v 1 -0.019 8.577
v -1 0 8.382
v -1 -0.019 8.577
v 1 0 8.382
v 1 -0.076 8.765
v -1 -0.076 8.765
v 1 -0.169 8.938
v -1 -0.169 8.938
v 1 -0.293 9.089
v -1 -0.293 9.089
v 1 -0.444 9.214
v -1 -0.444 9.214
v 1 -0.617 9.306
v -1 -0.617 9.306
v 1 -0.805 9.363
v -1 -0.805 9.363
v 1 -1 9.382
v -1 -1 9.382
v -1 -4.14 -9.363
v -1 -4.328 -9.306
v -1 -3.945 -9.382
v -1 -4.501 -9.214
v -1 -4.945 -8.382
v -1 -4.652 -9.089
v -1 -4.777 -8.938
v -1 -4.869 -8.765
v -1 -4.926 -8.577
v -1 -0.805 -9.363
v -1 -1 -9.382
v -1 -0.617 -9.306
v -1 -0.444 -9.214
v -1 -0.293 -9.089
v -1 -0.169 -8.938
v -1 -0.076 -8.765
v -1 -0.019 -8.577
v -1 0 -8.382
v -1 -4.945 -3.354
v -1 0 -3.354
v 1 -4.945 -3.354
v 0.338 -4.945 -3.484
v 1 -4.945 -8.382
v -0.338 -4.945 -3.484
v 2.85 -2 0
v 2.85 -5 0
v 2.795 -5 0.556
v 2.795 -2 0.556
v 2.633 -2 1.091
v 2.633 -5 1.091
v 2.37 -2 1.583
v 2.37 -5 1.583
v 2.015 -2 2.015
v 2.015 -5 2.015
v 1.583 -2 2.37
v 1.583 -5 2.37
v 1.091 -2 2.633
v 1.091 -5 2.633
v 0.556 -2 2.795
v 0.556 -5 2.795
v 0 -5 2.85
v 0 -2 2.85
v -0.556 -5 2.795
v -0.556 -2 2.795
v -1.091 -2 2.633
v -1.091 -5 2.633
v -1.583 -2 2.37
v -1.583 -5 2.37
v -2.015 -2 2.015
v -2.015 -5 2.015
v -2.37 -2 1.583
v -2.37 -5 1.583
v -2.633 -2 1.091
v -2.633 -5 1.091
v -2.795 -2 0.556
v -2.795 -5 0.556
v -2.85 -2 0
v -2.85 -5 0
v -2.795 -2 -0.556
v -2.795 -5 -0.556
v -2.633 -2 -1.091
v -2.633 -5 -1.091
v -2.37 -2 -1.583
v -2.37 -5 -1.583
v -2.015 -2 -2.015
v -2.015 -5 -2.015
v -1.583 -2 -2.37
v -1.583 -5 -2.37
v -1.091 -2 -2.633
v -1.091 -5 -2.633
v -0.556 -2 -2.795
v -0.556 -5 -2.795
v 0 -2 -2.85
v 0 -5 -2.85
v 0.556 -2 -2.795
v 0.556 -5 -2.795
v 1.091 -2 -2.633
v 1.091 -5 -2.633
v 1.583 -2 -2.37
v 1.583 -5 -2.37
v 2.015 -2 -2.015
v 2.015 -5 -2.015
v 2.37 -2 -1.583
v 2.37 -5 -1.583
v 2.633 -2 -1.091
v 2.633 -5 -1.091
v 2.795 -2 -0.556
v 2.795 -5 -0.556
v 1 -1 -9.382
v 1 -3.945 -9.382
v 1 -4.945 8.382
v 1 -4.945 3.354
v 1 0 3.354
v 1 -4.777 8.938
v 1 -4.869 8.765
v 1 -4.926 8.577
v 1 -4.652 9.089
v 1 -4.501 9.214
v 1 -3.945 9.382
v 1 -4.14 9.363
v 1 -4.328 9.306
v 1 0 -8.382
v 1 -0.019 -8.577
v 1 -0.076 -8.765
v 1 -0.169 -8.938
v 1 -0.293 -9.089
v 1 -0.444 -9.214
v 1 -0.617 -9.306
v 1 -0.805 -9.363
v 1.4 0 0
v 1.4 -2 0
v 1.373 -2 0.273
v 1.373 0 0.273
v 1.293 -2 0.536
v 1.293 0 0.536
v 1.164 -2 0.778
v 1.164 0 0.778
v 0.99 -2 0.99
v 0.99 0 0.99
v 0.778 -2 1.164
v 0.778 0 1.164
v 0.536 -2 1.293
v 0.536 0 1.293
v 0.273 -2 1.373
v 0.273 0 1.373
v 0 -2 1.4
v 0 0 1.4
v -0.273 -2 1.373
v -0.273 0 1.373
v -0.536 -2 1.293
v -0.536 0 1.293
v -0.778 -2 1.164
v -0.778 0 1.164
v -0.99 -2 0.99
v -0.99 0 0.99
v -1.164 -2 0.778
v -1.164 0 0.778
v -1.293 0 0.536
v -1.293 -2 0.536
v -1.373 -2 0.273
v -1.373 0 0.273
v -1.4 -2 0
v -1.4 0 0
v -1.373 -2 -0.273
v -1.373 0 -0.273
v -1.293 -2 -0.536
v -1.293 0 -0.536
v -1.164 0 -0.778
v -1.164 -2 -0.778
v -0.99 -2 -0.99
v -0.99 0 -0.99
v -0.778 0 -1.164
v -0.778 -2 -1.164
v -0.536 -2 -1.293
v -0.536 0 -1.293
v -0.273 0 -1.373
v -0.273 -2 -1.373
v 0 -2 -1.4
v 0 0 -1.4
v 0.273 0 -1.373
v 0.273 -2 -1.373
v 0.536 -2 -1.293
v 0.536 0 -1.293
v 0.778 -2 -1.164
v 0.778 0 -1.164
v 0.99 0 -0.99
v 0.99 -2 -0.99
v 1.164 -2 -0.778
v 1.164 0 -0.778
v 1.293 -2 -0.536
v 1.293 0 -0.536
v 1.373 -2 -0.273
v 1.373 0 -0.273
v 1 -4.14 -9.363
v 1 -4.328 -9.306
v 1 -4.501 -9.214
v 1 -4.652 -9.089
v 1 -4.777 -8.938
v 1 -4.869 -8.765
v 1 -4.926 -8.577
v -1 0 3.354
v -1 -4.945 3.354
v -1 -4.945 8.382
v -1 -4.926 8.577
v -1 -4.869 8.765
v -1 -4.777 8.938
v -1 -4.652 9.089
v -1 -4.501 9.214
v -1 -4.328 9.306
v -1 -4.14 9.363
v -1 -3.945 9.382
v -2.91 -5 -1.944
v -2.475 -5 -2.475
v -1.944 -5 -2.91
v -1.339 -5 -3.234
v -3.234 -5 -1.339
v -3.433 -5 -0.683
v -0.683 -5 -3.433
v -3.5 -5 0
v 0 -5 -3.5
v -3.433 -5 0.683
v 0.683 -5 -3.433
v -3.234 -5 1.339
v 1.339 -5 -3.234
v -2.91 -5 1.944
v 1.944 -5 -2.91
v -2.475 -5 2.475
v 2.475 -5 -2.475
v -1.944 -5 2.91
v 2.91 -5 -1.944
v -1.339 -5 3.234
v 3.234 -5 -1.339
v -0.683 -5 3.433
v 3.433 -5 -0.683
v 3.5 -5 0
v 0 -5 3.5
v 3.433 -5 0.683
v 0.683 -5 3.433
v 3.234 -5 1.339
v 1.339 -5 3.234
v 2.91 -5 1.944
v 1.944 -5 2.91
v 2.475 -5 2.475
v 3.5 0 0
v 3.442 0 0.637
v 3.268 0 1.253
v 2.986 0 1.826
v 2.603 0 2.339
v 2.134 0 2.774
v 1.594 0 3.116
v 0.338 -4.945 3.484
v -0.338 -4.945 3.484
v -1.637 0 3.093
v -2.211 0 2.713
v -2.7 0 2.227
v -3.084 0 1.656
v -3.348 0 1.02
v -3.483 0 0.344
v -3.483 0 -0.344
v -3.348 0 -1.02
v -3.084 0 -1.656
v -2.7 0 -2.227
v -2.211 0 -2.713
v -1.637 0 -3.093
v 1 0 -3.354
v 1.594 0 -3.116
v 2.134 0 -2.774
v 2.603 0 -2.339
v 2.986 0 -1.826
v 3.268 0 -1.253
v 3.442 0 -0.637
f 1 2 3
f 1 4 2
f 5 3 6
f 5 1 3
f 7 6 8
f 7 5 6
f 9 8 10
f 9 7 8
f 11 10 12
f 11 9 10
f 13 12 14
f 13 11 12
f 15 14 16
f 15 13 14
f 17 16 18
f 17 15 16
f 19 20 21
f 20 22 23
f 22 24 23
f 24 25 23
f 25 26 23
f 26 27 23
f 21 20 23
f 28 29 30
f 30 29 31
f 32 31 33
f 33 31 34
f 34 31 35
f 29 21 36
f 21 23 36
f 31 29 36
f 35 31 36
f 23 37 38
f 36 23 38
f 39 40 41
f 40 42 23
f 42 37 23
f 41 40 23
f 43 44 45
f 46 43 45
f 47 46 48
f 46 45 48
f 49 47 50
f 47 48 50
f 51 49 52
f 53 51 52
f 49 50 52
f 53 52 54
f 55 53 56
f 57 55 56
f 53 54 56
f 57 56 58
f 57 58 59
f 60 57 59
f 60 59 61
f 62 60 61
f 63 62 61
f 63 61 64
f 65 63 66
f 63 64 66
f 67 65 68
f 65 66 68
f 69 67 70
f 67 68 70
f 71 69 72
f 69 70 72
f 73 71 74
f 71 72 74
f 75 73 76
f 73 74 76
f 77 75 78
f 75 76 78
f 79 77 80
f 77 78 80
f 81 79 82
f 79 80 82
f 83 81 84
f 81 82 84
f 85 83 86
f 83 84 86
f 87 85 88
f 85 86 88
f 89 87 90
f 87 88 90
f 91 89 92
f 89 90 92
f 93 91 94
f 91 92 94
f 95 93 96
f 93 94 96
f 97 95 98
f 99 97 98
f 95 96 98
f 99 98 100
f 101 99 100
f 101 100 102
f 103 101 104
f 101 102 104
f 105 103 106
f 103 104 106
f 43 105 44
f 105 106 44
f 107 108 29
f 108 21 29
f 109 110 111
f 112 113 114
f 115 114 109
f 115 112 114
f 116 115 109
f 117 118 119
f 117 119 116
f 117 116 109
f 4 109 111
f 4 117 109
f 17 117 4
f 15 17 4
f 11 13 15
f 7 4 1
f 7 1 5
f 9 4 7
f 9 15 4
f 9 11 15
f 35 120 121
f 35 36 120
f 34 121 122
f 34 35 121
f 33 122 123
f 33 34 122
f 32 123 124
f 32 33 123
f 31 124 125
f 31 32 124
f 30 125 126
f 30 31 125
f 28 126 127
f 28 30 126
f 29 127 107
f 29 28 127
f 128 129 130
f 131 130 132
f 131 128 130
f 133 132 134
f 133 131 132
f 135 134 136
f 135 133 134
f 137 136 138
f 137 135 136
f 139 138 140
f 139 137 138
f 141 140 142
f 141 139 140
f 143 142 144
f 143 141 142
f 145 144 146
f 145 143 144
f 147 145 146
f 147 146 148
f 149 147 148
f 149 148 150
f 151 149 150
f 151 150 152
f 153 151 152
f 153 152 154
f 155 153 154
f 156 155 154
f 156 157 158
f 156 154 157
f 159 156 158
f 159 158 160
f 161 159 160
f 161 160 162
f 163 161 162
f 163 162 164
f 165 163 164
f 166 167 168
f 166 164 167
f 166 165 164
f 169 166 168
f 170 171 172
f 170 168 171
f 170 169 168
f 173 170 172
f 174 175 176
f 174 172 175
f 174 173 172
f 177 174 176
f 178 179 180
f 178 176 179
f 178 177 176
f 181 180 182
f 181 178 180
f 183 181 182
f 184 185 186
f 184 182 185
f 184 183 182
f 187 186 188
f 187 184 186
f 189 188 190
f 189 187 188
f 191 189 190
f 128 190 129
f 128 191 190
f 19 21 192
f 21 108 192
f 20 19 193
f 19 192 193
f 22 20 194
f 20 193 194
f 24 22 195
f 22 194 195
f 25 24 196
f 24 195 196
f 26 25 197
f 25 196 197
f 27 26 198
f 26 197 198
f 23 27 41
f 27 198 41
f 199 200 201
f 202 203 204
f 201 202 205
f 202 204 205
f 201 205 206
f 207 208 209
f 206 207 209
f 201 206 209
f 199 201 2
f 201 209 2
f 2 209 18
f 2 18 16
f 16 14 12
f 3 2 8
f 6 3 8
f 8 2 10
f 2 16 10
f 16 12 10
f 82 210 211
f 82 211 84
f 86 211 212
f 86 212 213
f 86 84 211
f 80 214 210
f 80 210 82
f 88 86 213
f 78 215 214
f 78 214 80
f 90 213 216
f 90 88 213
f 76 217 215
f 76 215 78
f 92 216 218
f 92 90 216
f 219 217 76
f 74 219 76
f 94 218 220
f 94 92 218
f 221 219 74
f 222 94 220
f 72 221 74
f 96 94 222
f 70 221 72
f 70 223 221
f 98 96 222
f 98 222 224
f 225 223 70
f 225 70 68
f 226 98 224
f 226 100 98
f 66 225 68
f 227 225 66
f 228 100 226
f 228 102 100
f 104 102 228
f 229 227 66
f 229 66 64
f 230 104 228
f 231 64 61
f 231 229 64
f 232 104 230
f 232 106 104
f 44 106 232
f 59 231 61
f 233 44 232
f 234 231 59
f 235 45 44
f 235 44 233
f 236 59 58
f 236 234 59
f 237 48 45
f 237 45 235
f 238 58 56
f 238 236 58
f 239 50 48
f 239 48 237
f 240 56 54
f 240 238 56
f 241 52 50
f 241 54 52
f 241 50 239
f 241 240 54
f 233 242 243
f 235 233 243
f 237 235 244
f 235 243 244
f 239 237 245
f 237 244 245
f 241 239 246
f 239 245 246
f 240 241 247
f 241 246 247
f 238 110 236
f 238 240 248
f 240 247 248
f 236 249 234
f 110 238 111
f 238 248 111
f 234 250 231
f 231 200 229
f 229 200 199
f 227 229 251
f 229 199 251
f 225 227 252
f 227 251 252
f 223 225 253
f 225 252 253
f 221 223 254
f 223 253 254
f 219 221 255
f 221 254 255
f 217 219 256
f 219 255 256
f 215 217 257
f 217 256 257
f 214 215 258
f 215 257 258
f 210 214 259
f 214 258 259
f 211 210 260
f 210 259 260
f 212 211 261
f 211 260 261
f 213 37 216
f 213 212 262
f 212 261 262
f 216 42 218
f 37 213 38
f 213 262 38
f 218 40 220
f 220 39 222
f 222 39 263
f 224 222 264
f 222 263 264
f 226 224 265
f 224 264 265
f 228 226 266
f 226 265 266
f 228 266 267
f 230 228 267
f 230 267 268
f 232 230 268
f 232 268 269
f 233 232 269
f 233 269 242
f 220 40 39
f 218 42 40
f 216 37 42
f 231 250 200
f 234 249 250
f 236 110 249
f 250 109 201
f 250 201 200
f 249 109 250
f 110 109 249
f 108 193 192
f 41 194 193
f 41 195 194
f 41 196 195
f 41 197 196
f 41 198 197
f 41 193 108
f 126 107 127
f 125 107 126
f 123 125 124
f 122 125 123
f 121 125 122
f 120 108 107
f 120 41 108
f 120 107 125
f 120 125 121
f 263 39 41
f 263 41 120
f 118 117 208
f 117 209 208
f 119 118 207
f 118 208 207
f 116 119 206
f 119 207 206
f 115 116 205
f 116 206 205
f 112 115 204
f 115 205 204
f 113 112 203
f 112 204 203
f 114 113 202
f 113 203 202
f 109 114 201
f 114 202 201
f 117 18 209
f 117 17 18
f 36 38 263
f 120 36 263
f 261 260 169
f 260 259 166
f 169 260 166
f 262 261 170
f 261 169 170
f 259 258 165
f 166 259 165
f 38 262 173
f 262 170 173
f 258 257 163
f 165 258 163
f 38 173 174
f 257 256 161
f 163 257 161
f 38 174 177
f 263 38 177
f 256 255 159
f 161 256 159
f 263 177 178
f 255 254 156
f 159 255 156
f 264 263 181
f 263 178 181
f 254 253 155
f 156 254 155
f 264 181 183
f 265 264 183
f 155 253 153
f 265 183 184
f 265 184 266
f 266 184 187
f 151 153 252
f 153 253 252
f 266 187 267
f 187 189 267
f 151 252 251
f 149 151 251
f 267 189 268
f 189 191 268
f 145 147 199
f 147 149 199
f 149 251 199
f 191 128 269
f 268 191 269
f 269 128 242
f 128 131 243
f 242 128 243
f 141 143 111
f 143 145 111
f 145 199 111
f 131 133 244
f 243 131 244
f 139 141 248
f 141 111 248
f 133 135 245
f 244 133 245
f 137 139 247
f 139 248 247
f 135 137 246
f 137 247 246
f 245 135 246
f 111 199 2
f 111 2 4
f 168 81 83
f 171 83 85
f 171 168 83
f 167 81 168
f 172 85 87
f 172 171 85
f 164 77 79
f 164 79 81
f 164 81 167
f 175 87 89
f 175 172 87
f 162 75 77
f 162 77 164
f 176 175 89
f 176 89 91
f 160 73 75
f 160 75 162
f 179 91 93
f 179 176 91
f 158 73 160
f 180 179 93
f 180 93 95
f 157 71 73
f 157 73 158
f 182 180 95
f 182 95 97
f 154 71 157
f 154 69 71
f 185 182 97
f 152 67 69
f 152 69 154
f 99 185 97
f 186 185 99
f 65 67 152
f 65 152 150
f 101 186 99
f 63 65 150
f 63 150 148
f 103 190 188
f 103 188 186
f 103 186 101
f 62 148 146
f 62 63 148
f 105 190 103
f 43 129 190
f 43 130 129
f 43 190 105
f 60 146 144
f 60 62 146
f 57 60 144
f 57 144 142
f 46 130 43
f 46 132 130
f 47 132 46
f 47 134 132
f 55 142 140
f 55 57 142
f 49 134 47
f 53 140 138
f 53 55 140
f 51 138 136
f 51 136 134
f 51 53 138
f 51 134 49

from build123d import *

# Parameters (mm, degrees)
F0_R     = 3.5
F0_R_2   = 1.4
F1_DEPTH = 5
F4_DEPTH = 1
F2_R     = 2.85
F5_DEPTH = 3
F6_R     = 1


with BuildPart() as f1:
    # F0 (on Front) → F1 (new body)
    with BuildSketch(Plane.XZ):
        Circle(F0_R)
        Circle(F0_R_2, mode=Mode.SUBTRACT)
    extrude(amount=F1_DEPTH)

    # F3 (on Right) → F4 (join, symmetric)
    with BuildSketch(Plane.YZ):
        Polygon((0, -3.5), (0, -1.75), (-4.945105, -1.75), (-4.945105, -3.382278), (-4.945105, -3.5), (-4.945105, -9.382278), (0, -9.382278), align=None)
        Polygon((-4.945105, 1.75), (0, 1.75), (0, 3.5), (0, 9.382278), (-4.945105, 9.382278), (-4.945105, 3.5), (-4.945105, 3.382278), align=None)
    extrude(amount=F4_DEPTH, both=True)

    # F2 (on face) → F5 (cut)
    with BuildSketch(Plane.XZ.offset(5)):
        Circle(F2_R)
    extrude(amount=-F5_DEPTH, mode=Mode.SUBTRACT)

    # F6
    f6_edges = [f1.edges().sort_by_distance(p)[0] for p in [
        (0, -4.945105, 9.382278),
        (0, 0, 9.382278),
        (0, -4.945105, -9.382278),
        (0, 0, -9.382278),
    ]]
    fillet(f6_edges, radius=F6_R)


solid = f1.part
